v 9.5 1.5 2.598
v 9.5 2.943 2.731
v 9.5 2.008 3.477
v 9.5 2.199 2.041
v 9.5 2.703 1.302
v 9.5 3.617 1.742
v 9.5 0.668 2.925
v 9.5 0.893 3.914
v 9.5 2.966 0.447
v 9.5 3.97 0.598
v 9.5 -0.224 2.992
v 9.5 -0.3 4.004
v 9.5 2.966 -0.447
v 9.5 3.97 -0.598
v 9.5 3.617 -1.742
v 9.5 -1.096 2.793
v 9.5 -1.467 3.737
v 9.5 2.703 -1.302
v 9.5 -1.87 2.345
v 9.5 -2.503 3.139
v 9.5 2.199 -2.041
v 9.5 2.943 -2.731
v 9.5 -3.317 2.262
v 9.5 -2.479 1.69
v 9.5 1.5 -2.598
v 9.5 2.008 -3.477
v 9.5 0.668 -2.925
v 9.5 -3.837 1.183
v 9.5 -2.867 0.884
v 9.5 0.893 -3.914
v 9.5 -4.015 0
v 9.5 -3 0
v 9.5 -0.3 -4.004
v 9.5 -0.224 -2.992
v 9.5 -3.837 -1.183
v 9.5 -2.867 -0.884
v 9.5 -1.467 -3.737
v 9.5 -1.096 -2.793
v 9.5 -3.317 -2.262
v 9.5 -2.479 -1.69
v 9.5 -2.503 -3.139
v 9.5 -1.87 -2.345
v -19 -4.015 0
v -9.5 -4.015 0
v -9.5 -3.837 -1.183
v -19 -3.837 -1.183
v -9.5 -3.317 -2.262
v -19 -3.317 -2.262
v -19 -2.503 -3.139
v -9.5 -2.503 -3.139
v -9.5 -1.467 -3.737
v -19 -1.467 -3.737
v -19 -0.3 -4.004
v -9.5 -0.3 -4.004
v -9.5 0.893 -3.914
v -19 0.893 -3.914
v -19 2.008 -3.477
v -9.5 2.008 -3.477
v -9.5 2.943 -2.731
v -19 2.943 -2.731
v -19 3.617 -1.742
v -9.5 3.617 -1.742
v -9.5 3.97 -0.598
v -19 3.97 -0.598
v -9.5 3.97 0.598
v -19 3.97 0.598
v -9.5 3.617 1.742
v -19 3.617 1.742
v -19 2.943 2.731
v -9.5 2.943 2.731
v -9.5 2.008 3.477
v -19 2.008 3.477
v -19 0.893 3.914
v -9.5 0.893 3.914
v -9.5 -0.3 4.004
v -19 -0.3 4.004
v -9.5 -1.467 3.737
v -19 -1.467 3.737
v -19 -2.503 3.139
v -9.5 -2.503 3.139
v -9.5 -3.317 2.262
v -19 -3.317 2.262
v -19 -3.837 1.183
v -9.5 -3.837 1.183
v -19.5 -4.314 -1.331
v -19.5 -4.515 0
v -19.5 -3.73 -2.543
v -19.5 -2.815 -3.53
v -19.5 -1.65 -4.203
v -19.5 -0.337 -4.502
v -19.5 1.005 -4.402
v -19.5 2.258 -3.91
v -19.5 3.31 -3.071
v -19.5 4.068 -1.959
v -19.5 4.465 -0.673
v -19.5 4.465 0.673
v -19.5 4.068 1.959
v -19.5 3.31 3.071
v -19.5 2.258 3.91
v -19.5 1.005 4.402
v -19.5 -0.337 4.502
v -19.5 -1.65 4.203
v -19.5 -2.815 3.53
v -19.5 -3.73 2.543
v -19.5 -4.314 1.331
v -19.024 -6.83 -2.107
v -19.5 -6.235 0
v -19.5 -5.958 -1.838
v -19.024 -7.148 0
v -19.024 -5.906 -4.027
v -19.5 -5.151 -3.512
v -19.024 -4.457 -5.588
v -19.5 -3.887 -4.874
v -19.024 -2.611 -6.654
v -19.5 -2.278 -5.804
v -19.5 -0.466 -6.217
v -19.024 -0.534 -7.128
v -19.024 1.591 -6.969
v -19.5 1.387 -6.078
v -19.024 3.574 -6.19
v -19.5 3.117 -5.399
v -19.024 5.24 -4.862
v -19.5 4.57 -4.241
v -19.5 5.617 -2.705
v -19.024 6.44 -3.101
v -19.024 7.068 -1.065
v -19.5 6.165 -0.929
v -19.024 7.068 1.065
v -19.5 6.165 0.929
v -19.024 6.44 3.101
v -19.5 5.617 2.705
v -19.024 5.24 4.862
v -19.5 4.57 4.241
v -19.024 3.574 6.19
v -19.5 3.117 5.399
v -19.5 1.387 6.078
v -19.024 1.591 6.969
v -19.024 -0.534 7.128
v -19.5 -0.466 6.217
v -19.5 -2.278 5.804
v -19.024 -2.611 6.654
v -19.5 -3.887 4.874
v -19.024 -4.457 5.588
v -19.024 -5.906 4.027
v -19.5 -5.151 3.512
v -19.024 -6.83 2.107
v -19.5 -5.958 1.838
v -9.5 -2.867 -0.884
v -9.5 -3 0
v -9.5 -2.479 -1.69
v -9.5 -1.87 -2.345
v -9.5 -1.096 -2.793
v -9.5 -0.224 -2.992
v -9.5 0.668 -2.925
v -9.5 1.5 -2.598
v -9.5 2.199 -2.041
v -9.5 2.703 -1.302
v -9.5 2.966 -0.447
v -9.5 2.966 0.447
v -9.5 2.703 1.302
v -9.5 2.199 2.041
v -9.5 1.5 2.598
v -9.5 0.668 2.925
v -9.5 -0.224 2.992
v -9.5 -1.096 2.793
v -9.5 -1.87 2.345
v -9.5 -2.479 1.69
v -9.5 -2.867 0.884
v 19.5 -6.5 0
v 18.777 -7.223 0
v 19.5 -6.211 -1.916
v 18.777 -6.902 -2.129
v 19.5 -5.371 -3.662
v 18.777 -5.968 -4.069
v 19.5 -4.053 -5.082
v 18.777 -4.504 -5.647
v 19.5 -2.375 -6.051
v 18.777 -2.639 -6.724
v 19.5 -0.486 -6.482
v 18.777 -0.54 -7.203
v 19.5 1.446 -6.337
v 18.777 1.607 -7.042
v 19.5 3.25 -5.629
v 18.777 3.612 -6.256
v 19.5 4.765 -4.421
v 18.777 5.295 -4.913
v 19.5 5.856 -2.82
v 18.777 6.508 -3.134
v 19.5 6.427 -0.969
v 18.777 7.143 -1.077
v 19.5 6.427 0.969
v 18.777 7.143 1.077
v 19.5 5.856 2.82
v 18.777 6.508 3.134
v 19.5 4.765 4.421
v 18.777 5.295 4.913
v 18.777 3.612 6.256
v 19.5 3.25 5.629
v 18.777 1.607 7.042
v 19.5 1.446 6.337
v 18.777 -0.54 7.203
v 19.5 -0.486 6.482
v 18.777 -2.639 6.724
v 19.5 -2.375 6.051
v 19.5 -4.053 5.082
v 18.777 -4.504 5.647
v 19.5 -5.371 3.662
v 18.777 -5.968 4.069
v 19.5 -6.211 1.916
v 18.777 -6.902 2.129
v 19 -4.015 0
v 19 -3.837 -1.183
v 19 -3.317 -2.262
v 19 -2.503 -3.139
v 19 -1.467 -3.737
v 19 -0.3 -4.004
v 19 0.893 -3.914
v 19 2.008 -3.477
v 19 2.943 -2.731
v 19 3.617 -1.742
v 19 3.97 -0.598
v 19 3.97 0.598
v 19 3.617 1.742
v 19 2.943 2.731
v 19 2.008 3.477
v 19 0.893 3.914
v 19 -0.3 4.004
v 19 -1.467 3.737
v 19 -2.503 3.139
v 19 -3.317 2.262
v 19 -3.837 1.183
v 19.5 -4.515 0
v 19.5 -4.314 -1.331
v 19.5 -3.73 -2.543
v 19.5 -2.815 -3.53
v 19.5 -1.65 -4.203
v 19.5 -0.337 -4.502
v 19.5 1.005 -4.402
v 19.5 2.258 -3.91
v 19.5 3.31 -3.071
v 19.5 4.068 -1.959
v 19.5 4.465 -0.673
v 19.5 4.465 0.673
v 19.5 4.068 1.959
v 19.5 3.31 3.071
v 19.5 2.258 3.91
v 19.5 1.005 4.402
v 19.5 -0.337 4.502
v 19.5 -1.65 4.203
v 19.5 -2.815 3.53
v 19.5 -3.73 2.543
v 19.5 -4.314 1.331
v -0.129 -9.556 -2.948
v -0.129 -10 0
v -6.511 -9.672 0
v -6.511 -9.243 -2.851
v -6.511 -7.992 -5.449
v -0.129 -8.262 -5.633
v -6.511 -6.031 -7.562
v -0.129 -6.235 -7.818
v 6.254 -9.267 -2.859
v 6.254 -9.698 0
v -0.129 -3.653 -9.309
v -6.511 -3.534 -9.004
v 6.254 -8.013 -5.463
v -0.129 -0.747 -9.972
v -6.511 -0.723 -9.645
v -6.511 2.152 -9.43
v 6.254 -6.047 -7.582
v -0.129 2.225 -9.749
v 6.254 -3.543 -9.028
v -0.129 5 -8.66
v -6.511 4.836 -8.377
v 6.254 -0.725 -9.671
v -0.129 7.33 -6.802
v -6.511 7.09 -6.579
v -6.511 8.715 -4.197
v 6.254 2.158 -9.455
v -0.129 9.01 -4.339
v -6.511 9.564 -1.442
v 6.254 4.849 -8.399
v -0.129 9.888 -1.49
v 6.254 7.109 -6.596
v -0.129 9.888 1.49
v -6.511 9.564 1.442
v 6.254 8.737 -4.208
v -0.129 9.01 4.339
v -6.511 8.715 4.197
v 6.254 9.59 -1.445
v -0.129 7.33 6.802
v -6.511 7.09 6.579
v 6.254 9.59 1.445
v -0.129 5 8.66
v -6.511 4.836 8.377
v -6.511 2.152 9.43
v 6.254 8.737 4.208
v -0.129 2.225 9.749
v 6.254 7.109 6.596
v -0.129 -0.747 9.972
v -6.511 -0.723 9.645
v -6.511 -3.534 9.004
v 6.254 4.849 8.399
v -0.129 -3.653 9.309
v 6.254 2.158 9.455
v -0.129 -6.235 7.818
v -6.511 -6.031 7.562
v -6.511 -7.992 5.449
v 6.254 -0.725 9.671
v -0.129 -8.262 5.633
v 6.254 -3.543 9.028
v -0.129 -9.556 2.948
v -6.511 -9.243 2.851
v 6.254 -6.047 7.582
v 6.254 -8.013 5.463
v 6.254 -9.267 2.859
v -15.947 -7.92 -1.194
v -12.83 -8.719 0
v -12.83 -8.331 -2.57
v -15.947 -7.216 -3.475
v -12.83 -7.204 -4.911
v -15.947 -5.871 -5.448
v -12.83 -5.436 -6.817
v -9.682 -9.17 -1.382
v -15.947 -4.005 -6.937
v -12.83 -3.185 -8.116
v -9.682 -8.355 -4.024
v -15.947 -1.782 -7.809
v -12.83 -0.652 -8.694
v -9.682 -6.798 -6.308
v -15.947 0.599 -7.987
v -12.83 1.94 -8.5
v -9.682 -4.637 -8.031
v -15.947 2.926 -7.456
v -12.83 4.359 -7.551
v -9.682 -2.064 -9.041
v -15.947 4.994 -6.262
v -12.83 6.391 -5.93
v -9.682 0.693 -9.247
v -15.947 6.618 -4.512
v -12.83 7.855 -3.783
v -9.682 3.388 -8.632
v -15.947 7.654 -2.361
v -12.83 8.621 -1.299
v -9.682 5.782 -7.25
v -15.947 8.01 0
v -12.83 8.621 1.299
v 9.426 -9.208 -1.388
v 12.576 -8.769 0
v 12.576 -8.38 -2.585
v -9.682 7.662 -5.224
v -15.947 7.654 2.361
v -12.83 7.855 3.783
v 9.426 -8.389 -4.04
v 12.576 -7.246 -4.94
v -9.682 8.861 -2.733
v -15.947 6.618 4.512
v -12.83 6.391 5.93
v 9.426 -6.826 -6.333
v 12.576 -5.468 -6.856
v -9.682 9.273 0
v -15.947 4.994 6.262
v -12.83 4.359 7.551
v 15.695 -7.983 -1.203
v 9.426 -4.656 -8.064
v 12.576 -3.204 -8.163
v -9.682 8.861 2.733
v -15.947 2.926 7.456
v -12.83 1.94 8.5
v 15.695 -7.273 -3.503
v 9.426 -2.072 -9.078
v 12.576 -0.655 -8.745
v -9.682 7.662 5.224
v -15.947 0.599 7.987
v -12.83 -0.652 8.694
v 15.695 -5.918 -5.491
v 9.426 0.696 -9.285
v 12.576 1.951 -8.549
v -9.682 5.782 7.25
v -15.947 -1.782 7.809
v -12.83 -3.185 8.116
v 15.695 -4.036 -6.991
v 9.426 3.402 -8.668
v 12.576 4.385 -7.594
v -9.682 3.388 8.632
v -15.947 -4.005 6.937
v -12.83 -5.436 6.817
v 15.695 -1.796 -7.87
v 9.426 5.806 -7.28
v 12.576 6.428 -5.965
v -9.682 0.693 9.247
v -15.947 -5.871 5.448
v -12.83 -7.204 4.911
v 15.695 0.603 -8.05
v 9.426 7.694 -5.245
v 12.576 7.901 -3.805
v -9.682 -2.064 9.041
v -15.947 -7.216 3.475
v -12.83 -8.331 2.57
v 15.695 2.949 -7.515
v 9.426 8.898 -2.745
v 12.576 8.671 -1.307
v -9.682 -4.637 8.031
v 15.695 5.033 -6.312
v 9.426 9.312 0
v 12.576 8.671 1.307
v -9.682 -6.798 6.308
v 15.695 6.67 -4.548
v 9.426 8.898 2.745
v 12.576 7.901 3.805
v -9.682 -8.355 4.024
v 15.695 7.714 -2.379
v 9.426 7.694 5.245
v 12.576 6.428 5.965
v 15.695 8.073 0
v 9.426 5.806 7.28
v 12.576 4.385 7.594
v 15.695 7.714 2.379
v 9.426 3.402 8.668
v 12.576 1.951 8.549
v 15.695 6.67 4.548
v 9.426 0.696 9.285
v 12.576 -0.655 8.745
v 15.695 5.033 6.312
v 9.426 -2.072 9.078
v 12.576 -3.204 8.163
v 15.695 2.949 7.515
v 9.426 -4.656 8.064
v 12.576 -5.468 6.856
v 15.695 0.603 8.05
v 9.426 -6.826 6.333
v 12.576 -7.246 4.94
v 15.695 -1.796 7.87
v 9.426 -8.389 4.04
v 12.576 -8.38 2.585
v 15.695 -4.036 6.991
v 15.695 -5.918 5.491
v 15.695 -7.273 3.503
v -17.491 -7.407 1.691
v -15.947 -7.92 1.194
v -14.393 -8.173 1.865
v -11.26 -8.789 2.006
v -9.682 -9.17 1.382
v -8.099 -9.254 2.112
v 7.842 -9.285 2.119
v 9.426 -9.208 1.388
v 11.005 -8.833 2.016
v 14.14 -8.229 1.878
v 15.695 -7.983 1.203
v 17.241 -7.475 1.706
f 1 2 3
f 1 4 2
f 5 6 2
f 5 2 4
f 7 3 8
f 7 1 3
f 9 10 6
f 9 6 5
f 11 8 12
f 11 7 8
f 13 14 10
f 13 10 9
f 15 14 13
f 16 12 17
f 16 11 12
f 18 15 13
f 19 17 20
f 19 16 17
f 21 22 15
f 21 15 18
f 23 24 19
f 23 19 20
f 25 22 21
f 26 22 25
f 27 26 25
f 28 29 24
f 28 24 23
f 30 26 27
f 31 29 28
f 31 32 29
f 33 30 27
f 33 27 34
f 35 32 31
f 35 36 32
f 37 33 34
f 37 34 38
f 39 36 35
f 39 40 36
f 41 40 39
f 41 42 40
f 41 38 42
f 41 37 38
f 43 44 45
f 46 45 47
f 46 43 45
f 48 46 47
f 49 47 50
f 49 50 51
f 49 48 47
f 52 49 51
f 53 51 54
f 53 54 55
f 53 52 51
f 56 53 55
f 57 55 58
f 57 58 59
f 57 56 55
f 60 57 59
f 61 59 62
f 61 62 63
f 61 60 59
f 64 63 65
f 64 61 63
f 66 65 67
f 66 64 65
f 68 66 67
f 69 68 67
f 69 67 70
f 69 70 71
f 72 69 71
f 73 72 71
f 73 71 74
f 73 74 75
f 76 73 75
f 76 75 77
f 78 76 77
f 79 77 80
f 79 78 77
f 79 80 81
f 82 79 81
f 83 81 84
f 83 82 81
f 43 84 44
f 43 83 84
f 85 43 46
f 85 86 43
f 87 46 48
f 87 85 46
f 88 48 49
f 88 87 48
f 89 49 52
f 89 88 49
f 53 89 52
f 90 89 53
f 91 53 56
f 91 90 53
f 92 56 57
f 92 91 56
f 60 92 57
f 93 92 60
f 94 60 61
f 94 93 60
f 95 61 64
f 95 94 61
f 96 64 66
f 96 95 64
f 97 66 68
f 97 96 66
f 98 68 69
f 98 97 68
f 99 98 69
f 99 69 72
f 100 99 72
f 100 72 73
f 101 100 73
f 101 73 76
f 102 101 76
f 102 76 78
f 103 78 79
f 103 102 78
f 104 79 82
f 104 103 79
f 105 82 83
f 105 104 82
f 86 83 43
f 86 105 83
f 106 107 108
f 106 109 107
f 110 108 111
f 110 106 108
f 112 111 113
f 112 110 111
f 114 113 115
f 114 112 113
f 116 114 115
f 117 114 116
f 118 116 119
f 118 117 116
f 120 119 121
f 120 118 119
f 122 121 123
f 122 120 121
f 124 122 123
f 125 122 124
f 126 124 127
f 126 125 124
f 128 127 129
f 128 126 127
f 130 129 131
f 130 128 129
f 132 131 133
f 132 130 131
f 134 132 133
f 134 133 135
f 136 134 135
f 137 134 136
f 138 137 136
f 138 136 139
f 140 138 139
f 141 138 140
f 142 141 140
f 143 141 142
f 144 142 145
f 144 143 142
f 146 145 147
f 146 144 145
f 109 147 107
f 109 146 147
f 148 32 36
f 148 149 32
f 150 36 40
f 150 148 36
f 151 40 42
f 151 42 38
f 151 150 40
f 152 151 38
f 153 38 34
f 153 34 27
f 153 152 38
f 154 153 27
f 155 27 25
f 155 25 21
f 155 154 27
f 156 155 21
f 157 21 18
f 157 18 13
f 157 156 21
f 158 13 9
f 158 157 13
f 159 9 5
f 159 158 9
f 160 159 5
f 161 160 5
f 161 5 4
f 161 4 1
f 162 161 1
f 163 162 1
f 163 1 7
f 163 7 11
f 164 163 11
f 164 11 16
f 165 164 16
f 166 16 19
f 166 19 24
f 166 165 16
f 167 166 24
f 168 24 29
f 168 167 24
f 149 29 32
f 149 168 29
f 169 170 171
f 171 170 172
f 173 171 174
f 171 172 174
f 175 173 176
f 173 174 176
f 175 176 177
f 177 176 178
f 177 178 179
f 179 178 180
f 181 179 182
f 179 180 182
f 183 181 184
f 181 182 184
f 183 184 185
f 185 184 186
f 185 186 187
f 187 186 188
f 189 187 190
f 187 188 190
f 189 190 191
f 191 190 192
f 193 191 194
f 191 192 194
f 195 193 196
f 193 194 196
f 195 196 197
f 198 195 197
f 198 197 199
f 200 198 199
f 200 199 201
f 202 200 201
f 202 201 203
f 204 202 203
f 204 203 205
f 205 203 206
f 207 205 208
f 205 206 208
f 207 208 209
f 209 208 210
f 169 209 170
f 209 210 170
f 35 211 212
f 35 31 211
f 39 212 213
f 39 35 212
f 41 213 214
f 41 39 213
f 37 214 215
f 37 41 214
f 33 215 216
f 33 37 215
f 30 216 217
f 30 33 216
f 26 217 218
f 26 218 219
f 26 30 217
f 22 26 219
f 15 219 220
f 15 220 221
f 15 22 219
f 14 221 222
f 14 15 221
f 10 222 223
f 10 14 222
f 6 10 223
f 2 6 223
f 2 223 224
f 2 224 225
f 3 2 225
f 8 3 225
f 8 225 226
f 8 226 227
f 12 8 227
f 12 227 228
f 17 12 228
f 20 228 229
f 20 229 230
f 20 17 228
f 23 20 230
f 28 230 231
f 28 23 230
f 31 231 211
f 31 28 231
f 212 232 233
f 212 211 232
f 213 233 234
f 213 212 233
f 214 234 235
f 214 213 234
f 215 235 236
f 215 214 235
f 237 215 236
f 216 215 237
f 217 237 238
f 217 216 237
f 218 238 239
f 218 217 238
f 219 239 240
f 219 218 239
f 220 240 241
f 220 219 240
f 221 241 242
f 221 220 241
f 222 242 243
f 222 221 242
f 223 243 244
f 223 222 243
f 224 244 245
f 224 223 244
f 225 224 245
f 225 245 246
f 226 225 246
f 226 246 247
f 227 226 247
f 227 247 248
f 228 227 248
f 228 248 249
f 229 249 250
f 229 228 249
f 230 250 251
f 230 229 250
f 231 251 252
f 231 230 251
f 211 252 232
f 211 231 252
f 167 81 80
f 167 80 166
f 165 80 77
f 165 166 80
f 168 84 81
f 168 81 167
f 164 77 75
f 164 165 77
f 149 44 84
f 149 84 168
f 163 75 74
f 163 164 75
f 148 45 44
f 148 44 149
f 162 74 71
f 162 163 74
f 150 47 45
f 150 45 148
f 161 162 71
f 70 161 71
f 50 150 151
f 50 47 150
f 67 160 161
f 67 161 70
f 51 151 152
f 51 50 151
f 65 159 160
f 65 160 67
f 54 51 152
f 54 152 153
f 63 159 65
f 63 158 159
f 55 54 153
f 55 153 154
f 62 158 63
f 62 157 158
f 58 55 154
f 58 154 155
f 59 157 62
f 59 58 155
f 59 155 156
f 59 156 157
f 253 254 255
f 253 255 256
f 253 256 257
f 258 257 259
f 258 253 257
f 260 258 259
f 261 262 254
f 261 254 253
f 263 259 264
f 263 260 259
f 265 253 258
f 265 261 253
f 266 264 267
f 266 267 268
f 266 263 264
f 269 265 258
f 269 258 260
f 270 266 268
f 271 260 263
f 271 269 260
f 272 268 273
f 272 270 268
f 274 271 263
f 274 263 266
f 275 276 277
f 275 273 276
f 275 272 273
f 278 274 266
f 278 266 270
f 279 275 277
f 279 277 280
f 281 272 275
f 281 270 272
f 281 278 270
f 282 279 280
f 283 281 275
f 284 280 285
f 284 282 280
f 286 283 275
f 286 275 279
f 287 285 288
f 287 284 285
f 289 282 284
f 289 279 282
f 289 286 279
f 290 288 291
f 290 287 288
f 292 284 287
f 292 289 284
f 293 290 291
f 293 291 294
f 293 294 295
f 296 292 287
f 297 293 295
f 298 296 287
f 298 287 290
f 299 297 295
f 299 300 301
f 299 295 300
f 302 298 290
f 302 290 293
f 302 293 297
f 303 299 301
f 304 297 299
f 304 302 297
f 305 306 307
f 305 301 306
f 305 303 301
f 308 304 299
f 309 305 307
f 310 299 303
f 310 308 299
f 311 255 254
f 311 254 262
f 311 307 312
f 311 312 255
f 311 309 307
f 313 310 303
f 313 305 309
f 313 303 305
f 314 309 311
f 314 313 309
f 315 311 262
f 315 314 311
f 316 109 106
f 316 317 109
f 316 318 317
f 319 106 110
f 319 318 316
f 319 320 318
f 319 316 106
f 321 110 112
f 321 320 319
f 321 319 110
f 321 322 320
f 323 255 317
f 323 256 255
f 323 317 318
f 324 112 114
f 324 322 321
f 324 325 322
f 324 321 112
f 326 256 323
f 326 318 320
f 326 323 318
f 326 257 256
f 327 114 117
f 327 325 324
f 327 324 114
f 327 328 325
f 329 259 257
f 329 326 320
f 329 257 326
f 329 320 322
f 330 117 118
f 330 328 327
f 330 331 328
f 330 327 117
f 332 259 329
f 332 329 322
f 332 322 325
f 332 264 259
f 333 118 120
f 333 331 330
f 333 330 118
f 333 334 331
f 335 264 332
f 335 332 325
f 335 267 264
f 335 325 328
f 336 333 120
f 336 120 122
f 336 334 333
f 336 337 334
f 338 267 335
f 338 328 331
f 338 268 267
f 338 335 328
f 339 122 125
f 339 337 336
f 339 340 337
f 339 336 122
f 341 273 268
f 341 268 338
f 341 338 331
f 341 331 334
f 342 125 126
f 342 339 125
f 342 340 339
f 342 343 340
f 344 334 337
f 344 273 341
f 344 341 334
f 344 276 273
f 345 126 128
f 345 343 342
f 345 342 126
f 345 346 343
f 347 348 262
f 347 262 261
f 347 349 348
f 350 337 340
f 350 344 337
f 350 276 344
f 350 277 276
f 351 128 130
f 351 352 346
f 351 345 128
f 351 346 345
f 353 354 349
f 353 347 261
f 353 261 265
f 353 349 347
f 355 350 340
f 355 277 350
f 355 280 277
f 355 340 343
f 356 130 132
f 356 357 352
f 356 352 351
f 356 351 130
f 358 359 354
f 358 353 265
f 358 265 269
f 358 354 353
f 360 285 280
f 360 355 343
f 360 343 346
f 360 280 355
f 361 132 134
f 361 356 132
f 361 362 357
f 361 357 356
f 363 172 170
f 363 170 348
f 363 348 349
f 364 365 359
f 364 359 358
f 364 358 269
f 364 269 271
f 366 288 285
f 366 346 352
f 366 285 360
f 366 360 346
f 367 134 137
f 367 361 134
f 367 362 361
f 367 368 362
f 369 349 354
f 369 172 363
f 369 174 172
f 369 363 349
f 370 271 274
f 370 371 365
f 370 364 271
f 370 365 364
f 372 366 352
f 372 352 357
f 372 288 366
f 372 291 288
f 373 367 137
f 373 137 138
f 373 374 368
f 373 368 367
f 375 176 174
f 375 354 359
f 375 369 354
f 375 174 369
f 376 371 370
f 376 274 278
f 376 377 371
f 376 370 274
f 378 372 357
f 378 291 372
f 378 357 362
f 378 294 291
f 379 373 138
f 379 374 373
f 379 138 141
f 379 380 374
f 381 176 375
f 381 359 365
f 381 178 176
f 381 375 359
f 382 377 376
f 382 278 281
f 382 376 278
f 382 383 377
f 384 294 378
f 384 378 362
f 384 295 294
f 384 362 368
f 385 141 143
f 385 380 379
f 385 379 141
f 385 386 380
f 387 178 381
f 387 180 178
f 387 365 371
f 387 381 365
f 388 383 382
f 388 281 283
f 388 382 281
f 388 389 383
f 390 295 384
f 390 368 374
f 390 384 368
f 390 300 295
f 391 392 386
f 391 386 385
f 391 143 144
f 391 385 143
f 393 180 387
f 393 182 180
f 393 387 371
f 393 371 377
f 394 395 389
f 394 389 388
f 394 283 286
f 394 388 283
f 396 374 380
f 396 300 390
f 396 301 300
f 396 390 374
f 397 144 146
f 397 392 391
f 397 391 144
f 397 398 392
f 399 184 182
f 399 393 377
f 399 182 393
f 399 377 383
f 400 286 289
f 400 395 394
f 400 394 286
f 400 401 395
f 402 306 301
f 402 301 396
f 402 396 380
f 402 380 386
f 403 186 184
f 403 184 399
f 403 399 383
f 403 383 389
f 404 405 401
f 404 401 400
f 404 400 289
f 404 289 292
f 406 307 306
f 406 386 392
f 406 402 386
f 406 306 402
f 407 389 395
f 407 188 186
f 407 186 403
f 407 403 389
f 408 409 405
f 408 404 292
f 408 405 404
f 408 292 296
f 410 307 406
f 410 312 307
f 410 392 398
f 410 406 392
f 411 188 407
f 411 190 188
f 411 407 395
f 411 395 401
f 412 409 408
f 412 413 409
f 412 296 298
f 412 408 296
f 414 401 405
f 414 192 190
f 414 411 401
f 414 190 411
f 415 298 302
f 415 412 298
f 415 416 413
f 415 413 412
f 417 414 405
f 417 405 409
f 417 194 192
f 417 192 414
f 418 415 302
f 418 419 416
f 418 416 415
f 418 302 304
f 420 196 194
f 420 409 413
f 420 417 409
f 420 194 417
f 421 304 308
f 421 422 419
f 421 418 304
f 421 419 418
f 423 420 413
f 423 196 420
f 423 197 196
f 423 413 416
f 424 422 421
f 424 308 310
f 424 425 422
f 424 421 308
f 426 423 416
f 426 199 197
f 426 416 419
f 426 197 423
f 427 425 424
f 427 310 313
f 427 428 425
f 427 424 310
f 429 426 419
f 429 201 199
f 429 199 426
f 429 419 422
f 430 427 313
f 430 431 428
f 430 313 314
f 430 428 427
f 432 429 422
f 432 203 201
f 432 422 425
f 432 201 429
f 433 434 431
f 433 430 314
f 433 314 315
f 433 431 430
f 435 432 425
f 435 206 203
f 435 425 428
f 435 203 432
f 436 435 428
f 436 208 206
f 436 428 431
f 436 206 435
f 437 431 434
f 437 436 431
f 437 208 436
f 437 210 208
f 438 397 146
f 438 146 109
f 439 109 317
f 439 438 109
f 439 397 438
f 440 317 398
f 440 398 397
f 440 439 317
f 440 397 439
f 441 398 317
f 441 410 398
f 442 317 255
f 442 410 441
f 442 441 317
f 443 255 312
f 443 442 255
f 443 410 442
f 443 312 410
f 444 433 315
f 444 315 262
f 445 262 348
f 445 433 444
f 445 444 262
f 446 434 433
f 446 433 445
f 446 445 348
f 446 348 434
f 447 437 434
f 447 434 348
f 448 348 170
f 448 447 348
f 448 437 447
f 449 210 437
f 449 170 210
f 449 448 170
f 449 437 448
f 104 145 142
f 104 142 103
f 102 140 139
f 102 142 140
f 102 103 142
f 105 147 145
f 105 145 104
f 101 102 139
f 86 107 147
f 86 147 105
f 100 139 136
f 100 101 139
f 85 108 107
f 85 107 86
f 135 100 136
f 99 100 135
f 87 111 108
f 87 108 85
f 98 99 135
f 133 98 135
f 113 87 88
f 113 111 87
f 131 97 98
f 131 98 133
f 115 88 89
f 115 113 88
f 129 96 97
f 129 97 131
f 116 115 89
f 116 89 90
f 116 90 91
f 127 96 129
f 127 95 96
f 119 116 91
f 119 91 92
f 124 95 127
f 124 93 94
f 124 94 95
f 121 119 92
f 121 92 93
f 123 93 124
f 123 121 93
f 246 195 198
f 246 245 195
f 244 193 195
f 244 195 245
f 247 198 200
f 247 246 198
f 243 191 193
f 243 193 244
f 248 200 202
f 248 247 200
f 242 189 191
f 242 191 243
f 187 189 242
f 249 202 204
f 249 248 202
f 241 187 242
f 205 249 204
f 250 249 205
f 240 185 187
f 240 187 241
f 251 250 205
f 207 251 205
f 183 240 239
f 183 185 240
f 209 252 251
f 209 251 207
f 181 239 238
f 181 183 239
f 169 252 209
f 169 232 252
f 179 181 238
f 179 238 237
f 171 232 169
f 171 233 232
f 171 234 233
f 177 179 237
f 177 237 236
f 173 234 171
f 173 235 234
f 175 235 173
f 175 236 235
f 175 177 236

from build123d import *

# Parameters (mm, degrees)
CHAMFER1_SIZE   = 0.5
CHAMFER1_SIZE_2 = 0.765486726


with BuildPart() as part:
    # Sketch1 → Revolve1 (revolve)
    with BuildSketch(Plane.XY, mode=Mode.PRIVATE) as revolve1_sk:
        with BuildLine():
            Line((19.5, 7), (19.5, 4.015))
            Line((19.5, 4.015), (9.5, 4.015))
            Line((9.5, 4.015), (9.5, 3))
            Line((9.5, 3), (-9.5, 3))
            Line((-9.5, 3), (-9.5, 4.015))
            Line((-9.5, 4.015), (-19.5, 4.015))
            Line((-19.5, 4.015), (-19.5, 7))
            ThreePointArc((-19.5, 7), (0, 10), (19.5, 7))
        make_face()
    revolve(revolve1_sk.sketch.rotate(Axis((-19.5, 0, 0), (1, 0, 0)), 180), axis=Axis((-19.5, 0, 0), (1, 0, 0)))

    # Chamfer1
    # the kernel refuses this chamfer: 0.765486726, 0.5 mm, written as the material it takes off along each edge
    with BuildSketch(Plane(origin=(19.5, 0, 0), x_dir=(0, -1, 0), z_dir=(0, 0, 1))) as chamfer1_piece_1:
        with BuildLine():
            Line((7 - CHAMFER1_SIZE, 0), (7.223326537, -0.723326537))
            ThreePointArc((7.223326537, -0.723326537), (7.116710271, -0.374271708), (7, 0))
            Line((7, 0), (7 - CHAMFER1_SIZE, 0))
        make_face()
    revolve(axis=Axis((19.5, 0, 0), (1, 0, 0)), mode=Mode.SUBTRACT)
    with BuildSketch(Plane(origin=(-19.5, 0, 0), x_dir=(0, -1, 0), z_dir=(0, 0, 1))) as chamfer1_piece_2:
        with BuildLine():
            Line((7 - CHAMFER1_SIZE_2, 0), (7.147890601, 0.475629668))
            ThreePointArc((7.147890601, 0.475629668), (7.077602322, 0.247969183), (7, 0))
            Line((7, 0), (7 - CHAMFER1_SIZE_2, 0))
        make_face()
    revolve(axis=Axis((-19.5, 0, 0), (1, 0, 0)), mode=Mode.SUBTRACT)
    with BuildSketch(Plane(origin=(-19.5, 0, 0), x_dir=(0, -1, 0), z_dir=(0, 0, 1))) as chamfer1_piece_3:
        Polygon((4.015, CHAMFER1_SIZE), (4.015 + CHAMFER1_SIZE, 0), (4.015, 0), align=None)
    revolve(axis=Axis((-19.5, 0, 0), (1, 0, 0)), mode=Mode.SUBTRACT)
    with BuildSketch(Plane(origin=(19.5, 0, 0), x_dir=(0, -1, 0), z_dir=(0, 0, 1))) as chamfer1_piece_4:
        Polygon((4.015 + CHAMFER1_SIZE, 0), (4.015, -CHAMFER1_SIZE), (4.015, 0), align=None)
    revolve(axis=Axis((19.5, 0, 0), (1, 0, 0)), mode=Mode.SUBTRACT)


solid = part.part
